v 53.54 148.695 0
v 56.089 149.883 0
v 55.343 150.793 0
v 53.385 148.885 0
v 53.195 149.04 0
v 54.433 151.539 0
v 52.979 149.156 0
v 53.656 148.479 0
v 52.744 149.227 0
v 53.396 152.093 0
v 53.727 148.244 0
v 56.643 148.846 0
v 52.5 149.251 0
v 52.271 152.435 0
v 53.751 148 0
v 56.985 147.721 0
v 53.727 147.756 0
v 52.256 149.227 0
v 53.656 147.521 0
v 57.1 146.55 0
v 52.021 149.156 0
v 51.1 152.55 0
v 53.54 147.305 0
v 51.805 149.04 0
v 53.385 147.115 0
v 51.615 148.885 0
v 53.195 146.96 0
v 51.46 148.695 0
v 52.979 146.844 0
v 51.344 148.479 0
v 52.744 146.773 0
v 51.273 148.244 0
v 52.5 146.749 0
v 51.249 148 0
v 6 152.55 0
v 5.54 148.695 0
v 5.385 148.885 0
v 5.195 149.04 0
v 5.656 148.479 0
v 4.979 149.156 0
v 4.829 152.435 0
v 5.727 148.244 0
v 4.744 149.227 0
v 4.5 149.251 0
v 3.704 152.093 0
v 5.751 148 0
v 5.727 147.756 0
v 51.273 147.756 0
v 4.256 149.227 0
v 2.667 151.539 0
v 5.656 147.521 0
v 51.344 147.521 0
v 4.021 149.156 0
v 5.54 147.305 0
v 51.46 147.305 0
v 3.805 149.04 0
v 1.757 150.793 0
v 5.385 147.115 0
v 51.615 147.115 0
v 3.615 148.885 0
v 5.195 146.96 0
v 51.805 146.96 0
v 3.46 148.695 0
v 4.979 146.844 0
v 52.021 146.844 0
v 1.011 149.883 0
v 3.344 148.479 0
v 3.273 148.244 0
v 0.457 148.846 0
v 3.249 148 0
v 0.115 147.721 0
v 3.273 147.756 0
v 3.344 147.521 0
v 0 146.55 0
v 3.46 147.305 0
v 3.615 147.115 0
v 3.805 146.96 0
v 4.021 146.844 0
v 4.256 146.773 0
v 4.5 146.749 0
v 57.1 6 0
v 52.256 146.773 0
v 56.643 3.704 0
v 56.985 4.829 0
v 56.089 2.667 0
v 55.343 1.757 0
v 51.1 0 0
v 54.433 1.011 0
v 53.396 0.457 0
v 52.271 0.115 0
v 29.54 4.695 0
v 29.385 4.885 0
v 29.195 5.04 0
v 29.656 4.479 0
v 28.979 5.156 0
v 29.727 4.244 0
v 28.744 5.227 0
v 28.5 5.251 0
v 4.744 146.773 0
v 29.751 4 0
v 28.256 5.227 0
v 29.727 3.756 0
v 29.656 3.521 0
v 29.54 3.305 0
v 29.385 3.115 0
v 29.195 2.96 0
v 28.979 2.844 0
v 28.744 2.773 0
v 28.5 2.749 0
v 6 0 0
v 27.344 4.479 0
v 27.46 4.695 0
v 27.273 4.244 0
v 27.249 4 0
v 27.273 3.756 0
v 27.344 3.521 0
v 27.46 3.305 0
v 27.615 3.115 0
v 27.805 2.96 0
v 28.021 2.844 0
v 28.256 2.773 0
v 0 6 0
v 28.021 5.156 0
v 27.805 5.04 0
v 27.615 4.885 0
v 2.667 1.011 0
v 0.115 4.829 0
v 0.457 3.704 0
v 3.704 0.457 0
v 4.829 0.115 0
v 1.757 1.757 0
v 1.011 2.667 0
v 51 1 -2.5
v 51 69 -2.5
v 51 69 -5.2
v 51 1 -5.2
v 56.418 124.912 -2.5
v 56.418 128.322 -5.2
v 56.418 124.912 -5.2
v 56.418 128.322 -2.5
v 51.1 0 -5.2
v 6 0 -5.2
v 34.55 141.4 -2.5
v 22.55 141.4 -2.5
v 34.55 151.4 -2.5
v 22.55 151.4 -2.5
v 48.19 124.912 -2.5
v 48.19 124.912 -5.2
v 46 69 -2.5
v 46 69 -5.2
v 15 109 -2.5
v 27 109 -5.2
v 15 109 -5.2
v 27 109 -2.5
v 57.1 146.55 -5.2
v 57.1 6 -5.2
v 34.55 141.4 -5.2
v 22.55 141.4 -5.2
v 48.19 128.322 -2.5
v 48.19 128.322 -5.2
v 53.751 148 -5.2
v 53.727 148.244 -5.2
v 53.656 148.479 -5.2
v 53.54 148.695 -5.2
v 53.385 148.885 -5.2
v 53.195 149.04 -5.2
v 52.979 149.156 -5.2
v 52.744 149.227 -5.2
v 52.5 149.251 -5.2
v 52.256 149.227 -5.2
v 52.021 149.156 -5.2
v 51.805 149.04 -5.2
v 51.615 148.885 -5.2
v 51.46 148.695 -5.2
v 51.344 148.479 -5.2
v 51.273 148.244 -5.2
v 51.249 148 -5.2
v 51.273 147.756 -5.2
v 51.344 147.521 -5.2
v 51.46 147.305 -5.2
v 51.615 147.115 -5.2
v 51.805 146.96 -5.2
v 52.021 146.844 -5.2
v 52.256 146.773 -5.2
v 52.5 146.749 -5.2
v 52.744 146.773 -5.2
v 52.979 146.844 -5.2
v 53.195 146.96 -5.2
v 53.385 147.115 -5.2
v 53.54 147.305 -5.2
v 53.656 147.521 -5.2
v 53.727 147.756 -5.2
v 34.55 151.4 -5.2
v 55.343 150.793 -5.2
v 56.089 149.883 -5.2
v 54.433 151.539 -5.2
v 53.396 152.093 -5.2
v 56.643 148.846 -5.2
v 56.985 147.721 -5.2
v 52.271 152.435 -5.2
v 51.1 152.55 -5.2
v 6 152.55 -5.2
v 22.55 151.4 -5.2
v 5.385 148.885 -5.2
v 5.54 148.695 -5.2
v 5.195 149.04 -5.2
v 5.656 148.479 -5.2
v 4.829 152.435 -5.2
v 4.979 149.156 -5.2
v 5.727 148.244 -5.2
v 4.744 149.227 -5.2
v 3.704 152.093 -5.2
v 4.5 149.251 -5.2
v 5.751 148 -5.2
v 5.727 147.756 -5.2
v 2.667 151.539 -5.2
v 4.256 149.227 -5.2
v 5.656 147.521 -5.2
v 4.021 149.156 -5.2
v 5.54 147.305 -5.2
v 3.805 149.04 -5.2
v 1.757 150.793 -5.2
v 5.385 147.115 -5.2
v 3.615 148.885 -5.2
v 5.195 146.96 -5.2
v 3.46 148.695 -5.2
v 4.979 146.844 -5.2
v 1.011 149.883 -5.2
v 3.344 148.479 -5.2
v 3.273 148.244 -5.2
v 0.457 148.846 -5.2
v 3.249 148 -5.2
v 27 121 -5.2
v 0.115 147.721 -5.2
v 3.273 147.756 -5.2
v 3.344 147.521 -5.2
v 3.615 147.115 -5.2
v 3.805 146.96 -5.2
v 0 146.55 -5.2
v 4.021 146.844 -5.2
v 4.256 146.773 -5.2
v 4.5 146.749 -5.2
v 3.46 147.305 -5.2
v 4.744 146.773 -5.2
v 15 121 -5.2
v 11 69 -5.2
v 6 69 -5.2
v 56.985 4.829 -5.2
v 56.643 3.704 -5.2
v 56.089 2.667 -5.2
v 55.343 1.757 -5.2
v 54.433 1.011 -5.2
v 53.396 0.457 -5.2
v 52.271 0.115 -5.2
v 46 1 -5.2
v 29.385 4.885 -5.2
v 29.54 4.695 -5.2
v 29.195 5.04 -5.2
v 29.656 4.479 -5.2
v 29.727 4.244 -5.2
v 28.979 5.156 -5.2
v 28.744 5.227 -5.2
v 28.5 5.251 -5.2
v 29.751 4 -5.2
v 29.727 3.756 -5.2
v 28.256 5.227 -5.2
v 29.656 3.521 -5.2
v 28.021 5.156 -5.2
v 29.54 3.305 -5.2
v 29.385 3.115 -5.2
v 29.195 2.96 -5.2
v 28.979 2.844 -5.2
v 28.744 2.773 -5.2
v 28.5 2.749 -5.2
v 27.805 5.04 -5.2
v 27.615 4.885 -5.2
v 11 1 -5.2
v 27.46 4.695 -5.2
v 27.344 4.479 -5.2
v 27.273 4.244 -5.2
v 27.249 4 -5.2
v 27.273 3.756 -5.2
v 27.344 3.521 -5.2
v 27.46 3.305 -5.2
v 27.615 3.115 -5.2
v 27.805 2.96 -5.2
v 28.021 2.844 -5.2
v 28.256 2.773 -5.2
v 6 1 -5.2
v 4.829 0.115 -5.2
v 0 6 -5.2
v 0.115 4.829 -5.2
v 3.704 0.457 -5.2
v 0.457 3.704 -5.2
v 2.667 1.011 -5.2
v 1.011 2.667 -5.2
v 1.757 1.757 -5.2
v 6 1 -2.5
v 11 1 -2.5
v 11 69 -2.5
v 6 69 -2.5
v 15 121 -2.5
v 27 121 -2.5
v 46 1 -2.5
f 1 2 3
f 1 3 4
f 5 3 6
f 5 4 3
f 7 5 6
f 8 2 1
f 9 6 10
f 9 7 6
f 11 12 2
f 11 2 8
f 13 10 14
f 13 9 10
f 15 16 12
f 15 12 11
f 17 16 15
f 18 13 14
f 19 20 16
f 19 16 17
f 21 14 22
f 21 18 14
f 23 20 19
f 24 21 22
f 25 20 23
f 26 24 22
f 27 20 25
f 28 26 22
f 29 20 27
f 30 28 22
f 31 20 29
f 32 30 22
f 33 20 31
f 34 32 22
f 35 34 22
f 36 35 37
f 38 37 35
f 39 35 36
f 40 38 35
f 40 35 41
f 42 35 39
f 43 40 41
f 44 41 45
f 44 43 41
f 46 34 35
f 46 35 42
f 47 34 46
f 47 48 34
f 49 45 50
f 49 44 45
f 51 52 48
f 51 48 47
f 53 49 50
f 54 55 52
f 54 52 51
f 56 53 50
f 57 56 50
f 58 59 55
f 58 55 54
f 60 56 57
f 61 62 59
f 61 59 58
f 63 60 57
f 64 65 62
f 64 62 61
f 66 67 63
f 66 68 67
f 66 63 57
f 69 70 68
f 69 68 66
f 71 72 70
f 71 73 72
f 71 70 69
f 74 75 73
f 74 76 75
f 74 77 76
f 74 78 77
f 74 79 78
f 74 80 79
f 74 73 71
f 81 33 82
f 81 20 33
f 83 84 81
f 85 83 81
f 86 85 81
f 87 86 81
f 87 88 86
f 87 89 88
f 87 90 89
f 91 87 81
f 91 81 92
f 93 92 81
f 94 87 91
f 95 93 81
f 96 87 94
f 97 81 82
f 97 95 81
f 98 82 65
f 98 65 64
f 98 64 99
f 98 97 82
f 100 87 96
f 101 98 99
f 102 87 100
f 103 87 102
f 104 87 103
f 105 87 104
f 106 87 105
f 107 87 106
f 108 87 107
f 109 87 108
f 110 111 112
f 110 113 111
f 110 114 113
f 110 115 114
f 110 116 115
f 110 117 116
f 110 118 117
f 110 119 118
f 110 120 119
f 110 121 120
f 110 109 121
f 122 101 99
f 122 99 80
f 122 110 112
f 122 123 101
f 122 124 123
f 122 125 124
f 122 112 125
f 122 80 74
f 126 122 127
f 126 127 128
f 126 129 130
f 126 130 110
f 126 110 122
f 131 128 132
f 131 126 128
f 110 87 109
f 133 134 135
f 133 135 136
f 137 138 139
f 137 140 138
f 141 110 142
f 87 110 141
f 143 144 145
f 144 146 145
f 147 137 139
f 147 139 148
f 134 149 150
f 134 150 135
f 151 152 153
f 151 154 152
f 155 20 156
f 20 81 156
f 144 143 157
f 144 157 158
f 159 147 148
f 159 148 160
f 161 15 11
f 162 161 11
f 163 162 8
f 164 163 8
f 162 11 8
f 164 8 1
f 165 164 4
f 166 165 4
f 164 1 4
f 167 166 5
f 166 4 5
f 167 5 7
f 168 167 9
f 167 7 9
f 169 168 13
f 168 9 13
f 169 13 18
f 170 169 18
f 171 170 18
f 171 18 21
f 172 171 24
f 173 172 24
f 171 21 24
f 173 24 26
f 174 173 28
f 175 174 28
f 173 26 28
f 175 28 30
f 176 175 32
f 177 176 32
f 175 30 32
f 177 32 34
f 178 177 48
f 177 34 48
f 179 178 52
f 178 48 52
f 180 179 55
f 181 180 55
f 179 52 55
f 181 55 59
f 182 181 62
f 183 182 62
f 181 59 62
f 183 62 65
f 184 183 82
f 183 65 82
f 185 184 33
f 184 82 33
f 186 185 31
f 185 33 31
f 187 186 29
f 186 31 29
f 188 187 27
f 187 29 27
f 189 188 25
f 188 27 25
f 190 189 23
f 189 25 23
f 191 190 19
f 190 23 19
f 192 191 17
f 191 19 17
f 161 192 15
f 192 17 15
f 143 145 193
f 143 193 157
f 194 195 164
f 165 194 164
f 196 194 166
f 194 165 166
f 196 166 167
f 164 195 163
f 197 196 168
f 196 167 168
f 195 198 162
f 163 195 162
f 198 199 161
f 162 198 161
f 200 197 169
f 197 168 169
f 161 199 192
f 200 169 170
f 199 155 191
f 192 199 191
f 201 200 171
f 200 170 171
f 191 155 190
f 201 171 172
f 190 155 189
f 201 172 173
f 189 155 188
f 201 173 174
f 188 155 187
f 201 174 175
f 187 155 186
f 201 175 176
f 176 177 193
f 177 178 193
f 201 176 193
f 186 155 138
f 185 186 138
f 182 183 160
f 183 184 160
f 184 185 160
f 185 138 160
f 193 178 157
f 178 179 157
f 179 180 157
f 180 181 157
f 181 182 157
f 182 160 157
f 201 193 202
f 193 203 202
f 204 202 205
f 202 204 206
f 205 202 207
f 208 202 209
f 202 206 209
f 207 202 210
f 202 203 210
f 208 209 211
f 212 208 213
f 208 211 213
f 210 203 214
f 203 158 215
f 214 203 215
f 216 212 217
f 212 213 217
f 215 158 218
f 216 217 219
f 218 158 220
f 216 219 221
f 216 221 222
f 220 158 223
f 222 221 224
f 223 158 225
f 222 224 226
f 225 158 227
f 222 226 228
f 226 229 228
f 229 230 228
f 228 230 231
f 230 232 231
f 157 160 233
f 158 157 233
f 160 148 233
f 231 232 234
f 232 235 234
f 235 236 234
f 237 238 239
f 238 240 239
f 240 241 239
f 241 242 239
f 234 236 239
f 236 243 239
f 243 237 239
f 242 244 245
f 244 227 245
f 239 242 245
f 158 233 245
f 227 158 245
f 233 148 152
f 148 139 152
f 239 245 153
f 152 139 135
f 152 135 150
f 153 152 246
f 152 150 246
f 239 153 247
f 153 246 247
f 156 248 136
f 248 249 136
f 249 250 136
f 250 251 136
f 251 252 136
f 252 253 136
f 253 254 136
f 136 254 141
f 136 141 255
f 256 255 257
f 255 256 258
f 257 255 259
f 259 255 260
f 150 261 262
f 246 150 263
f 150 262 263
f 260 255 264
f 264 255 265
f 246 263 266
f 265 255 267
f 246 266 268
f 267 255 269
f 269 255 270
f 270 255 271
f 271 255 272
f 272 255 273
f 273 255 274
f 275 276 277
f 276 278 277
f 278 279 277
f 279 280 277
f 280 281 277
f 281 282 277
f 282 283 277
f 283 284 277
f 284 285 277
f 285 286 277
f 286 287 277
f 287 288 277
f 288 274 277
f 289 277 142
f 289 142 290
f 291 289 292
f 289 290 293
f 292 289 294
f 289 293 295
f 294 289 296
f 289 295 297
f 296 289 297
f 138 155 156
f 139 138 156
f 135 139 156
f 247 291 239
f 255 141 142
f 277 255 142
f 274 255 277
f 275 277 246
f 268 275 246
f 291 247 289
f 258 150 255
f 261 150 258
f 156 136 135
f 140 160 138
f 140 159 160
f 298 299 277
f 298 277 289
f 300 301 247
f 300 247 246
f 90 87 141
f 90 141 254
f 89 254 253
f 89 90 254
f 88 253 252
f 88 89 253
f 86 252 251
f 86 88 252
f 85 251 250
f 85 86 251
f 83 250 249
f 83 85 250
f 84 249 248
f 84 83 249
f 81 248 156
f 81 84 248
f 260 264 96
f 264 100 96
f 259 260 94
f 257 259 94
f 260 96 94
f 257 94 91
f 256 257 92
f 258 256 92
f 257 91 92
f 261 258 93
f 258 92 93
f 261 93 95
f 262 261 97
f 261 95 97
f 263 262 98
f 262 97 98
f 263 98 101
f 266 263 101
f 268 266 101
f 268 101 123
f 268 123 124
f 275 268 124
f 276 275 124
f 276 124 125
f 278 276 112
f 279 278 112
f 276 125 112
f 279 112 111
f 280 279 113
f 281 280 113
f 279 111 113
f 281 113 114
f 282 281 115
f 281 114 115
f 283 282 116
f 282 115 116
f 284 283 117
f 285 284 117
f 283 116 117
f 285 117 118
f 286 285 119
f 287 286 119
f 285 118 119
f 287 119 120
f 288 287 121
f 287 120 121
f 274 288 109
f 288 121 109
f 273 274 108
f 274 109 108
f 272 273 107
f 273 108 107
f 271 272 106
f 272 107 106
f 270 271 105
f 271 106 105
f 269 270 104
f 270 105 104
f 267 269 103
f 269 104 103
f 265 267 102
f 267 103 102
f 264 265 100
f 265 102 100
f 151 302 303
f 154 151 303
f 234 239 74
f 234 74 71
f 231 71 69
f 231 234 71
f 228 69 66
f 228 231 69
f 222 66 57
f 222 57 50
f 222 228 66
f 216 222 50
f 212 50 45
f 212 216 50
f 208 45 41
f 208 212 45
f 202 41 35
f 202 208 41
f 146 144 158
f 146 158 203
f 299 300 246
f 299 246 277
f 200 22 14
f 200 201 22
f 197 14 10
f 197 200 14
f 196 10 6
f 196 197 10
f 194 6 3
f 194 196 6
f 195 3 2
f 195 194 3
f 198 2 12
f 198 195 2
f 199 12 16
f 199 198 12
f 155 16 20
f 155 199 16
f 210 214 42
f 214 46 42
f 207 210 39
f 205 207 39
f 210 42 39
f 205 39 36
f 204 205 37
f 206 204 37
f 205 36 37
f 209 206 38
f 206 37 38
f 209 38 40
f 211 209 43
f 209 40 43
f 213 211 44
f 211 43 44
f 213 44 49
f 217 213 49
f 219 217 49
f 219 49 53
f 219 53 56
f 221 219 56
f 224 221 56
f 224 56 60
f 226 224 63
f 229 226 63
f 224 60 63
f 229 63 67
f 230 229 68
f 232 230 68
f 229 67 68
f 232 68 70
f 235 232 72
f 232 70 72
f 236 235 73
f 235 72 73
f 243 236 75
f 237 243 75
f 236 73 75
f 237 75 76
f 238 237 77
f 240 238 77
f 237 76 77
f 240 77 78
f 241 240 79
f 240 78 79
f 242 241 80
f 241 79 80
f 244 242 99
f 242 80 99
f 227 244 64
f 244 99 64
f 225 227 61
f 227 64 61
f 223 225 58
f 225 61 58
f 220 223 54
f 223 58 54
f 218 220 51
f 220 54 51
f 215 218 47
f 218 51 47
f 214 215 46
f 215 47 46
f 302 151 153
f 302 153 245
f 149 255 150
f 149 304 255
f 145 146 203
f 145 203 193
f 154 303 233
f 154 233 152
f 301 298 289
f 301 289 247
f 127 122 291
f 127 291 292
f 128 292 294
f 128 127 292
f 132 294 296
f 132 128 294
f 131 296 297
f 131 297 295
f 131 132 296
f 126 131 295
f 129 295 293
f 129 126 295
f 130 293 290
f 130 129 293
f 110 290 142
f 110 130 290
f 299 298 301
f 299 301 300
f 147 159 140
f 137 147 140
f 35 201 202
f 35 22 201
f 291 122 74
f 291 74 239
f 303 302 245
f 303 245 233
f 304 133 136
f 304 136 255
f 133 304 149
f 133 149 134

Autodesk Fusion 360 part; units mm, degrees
sketch "Sketch1" plane through (0, 0, 0) normal (0, 0, 1) x (1, 0, 0)
  line L0 (0, 0) -> (57.1, 0)
  line L1 (57.1, 0) -> (57.1, 152.3)
  line L2 (57.1, 152.3) -> (0, 152.3)
  line L3 (0, 152.3) -> (0, 0)
  circle A0 centre (28.5, 4) radius 1.2512
  circle A1 centre (52.5, 148) radius 1.2512
  circle A2 centre (4.5, 148) radius 1.2512
  line L4 (6, 69) -> (11, 69)
  line L5 (11, 69) -> (11, 1)
  line L6 (11, 1) -> (6, 1)
  line L7 (6, 1) -> (6, 69)
  line L8 (46, 1) -> (46, 69)
  line L9 (46, 69) -> (51, 69)
  line L10 (51, 69) -> (51, 1)
  line L11 (51, 1) -> (46, 1)
  line L12 (15, 121) -> (27, 121)
  line L13 (27, 121) -> (27, 109)
  line L14 (27, 109) -> (15, 109)
  line L15 (15, 109) -> (15, 121)
  line L16 (48.19, 128.3216) -> (56.4181, 128.3216)
  line L17 (56.4181, 128.3216) -> (56.4181, 124.9122)
  line L18 (56.4181, 124.9122) -> (48.19, 124.9122)
  line L19 (48.19, 124.9122) -> (48.19, 128.3216)
  line L20 (22.55, 151.4) -> (34.55, 151.4)
  line L21 (34.55, 151.4) -> (34.55, 141.4)
  line L22 (34.55, 141.4) -> (22.55, 141.4)
  line L23 (22.55, 141.4) -> (22.55, 151.4)
  dimension "d1" = 57.1
  dimension "d2" = 152.3
  dimension "d6" = 5
  dimension "d7" = 68
  dimension "d8" = 5
  dimension "d9" = 68
  dimension "d10" = 12
  dimension "d13" = 12
  dimension "d14" = 10
extrude "Extrude1" add sketch "Sketch1" against normal blind 2.5 contours L8 L9 L10 L11 makes body 1
extrude "Extrude2" add sketch "Sketch1" against normal blind 2.5 separate body contours L4 L5 L6 L7 makes body 2
extrude "Extrude3" add sketch "Sketch1" against normal blind 2.5 separate body contours L12 L13 L14 L15 makes body 3
extrude "Extrude4" add sketch "Sketch1" against normal blind 2.5 separate body contours L16 L17 L18 L19 makes body 4
extrude "Extrude5" add sketch "Sketch1" against normal blind 2.5 separate body contours L20 L21 L22 L23 makes body 5
extrude "Extrude6" add sketch "Sketch1" against normal blind 4 bodies 1 2 3 4 5
extrude "Extrude7" add 1 faces at (28.5262, 47.7496, -4) along direction (0, 0, -1) blind 1.2 on bodies 1 bodies 1
extrude "Extrude8" add 1 faces at (19.0333, 152.3, -3.4667) along direction (0, 1, 0) blind 0.25 on bodies 1 bodies 1
fillet "Fillet5" radius 6 4 edges at (57.1, 0, -2.6) (0, 0, -2.6) (0, 152.55, -2.6) (57.1, 152.55, -2.6) on bodies 1
